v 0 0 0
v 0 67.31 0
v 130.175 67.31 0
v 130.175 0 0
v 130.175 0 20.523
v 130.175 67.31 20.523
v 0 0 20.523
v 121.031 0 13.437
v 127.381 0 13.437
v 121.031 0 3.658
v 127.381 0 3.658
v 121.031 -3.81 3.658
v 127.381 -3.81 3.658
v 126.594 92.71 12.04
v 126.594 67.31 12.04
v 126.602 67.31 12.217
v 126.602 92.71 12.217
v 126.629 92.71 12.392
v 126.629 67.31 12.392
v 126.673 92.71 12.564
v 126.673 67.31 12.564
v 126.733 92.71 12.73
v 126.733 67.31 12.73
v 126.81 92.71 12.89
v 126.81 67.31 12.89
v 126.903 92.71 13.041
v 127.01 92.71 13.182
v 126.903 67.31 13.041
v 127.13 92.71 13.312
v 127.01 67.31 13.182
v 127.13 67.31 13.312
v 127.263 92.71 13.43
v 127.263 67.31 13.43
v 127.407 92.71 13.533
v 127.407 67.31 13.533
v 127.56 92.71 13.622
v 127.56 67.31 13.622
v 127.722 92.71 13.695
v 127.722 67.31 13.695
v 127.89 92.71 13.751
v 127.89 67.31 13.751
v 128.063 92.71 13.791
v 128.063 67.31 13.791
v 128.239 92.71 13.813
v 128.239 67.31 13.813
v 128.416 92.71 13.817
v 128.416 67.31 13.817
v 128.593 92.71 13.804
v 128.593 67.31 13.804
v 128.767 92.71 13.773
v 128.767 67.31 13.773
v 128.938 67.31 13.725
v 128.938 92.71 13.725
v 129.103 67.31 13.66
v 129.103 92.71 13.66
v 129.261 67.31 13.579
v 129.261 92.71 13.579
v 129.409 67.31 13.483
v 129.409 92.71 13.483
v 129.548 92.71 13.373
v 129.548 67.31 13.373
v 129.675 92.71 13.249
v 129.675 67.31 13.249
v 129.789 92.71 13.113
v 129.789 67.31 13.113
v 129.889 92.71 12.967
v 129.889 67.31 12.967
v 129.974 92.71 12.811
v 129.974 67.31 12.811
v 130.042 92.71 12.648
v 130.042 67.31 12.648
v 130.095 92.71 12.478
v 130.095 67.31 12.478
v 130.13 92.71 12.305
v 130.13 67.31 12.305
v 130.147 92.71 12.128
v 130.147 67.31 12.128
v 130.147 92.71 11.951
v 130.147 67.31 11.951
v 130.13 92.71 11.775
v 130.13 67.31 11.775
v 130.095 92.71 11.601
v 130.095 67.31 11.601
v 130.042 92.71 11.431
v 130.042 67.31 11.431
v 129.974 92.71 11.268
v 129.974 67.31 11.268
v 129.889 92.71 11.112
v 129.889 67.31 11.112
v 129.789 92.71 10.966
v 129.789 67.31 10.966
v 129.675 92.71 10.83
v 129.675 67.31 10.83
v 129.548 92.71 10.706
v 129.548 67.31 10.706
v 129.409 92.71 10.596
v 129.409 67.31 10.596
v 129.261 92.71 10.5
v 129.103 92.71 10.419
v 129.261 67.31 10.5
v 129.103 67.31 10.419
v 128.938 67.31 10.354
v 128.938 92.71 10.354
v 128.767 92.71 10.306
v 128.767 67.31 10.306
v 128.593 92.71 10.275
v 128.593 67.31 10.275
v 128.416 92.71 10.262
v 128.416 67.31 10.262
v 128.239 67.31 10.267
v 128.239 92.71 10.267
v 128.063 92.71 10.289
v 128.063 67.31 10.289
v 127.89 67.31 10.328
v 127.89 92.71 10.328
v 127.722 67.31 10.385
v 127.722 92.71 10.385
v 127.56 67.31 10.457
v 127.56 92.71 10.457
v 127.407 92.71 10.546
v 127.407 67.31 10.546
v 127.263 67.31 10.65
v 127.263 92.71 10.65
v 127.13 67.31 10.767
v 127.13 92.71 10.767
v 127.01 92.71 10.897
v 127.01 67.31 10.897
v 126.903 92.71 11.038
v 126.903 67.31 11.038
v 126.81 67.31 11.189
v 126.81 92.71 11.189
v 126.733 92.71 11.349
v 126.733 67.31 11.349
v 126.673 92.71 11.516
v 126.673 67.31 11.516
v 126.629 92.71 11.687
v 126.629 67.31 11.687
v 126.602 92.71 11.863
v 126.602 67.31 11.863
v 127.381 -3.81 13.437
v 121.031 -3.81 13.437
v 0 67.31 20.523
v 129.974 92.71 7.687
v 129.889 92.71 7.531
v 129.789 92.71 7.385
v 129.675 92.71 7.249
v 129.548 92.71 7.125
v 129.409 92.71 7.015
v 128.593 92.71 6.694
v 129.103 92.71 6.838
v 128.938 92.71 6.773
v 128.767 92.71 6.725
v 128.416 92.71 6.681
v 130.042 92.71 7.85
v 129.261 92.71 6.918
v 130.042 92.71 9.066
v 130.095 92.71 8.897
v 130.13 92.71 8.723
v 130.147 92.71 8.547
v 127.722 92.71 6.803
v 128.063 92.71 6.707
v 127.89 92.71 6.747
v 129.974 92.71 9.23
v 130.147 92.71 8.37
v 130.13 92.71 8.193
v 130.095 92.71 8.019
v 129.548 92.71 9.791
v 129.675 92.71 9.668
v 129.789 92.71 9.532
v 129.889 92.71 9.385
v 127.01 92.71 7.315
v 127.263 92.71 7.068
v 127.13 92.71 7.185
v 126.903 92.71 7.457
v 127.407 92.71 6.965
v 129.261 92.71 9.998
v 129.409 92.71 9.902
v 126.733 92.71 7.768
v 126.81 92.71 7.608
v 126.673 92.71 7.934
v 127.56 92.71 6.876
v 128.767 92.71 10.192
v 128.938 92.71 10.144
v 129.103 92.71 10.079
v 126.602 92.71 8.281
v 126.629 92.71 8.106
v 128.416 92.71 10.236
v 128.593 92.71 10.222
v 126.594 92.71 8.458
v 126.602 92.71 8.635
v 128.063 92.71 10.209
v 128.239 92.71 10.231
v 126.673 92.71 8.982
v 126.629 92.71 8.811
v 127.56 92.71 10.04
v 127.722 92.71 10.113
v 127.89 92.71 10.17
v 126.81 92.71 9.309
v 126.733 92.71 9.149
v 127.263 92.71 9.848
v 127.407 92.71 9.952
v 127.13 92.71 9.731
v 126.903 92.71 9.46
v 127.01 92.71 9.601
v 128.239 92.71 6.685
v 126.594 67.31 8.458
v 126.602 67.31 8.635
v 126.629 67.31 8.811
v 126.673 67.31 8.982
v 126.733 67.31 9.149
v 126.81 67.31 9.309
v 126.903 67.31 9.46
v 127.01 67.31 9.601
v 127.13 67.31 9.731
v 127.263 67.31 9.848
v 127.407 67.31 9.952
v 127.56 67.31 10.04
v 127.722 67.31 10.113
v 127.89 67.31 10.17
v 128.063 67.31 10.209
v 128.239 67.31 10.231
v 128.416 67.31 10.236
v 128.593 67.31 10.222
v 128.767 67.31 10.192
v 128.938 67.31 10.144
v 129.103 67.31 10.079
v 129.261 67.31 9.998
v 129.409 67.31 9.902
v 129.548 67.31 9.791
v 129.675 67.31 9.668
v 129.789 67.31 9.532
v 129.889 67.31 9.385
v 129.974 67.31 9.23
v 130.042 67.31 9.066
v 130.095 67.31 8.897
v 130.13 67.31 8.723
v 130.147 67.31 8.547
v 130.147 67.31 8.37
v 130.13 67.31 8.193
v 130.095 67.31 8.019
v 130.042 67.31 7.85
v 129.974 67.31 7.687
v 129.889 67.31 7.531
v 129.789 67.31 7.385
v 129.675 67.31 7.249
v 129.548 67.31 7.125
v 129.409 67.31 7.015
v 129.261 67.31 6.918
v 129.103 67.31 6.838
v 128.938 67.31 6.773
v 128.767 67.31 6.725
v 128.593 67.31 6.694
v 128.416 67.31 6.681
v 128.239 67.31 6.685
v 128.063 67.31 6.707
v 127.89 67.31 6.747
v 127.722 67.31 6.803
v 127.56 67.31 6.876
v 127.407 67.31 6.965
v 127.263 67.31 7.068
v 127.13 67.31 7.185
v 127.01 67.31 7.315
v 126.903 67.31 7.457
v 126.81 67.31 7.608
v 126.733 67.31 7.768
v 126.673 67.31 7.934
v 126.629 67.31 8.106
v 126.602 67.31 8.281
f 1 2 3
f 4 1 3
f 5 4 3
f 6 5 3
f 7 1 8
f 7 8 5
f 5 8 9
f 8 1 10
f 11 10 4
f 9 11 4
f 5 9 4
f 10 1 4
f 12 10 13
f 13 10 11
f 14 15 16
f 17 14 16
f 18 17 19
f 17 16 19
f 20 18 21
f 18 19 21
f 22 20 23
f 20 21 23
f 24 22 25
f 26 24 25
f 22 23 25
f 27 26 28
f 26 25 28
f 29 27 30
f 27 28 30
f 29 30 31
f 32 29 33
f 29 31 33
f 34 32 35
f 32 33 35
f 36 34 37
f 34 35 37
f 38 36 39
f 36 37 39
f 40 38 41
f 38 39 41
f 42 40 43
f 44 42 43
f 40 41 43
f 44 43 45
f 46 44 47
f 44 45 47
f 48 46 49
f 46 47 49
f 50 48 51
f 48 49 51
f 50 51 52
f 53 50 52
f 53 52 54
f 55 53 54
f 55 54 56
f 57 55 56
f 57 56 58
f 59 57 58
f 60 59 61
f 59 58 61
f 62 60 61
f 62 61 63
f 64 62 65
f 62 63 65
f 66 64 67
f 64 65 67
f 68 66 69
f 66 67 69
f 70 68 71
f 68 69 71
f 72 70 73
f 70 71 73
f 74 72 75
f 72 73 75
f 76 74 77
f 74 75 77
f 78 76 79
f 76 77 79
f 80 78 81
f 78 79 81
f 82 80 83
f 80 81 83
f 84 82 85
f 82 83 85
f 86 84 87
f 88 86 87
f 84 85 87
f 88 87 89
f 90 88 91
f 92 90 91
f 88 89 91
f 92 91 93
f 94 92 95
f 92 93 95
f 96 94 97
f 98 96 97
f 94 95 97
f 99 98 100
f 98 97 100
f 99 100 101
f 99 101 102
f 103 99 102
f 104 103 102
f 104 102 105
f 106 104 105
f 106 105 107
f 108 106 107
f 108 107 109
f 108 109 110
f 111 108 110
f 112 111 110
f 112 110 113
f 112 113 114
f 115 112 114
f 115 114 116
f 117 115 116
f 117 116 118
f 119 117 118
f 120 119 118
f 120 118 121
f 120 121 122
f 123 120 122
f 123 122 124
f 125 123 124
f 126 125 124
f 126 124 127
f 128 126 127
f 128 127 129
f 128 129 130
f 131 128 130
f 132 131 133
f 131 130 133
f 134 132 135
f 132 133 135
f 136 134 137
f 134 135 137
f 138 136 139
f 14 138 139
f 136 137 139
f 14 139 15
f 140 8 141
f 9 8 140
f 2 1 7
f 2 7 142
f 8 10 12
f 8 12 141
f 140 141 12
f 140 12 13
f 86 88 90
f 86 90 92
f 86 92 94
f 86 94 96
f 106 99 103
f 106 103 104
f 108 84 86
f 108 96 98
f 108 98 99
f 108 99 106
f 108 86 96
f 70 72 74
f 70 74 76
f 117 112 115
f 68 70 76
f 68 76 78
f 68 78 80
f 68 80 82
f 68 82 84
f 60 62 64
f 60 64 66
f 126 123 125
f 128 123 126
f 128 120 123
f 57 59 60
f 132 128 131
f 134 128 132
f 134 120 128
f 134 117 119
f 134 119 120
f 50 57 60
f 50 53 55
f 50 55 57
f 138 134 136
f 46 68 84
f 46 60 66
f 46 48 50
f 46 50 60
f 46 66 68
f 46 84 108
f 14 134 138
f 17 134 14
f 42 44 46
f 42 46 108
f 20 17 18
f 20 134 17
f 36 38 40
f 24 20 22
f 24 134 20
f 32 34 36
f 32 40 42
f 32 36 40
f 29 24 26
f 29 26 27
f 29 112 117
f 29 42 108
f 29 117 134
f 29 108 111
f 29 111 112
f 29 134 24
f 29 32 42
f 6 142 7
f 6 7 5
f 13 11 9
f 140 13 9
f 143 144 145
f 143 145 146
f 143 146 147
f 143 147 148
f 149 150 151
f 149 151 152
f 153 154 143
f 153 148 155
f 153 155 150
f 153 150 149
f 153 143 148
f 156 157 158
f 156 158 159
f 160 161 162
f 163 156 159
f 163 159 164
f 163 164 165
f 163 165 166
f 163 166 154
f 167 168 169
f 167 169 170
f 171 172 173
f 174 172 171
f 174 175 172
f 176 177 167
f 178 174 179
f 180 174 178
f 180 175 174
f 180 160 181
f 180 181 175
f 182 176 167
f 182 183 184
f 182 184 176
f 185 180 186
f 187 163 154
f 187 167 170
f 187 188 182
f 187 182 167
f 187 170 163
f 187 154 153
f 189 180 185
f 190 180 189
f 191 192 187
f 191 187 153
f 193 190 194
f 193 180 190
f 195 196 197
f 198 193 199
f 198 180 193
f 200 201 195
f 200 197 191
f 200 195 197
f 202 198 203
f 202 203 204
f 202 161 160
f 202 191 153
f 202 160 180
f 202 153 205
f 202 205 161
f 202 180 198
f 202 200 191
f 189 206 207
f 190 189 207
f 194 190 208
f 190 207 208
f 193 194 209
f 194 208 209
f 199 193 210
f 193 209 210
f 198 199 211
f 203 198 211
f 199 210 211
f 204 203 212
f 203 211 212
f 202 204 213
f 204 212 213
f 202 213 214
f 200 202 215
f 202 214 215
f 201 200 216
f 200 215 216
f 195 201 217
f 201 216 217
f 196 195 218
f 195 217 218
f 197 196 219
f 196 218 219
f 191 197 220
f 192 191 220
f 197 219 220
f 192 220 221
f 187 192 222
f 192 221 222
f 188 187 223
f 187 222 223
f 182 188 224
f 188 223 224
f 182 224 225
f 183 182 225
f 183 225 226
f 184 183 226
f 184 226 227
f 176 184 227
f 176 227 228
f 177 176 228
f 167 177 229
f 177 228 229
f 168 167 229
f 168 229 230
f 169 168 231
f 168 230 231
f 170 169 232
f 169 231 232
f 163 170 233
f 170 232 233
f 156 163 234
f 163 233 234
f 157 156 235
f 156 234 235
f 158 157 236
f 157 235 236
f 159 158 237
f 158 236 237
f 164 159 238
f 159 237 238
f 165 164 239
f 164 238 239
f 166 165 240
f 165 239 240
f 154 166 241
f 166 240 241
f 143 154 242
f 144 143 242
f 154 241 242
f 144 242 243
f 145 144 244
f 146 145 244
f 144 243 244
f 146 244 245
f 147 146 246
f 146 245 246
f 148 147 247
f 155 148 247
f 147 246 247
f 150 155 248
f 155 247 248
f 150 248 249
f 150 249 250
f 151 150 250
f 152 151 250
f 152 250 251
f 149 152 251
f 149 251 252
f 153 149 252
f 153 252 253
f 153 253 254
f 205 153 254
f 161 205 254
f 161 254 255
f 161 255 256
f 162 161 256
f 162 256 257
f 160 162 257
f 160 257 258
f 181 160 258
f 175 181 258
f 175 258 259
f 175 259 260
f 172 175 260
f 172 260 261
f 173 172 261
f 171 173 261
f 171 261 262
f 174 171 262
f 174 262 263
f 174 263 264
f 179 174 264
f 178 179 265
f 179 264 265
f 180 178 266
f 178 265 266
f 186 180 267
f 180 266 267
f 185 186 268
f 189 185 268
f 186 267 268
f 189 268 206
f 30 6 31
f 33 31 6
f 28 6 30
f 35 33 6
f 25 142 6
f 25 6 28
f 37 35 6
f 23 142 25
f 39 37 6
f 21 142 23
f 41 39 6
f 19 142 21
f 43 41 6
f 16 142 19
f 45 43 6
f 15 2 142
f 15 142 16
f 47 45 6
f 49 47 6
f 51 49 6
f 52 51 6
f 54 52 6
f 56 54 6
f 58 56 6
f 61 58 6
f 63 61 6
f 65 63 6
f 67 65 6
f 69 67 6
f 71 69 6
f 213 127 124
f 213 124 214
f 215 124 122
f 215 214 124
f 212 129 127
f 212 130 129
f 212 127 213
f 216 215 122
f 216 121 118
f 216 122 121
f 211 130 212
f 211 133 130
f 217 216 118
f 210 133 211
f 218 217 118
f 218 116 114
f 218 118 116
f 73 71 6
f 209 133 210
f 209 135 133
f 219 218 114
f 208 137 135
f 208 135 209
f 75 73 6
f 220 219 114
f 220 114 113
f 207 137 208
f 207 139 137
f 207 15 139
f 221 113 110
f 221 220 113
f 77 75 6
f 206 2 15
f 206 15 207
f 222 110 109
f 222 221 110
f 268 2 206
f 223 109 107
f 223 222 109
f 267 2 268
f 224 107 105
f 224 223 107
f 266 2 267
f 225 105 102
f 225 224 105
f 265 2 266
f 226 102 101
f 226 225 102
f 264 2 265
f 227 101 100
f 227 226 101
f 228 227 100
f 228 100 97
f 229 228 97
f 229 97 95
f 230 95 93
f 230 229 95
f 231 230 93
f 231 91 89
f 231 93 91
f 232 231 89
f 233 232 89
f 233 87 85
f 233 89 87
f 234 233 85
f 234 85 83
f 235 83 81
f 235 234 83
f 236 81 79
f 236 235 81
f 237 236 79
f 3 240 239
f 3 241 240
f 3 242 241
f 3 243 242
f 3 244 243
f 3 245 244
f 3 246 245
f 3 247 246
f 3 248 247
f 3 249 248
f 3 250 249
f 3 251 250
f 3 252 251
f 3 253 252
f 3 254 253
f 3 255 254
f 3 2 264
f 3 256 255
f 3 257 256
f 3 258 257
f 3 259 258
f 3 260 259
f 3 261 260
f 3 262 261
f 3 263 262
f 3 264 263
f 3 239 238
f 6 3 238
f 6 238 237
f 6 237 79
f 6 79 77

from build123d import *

# Parameters (mm, degrees)
F0_W     = 130.175
F0_H     = 67.31
F1_DEPTH = 20.5232
F2_W     = 6.35
F2_H     = 9.779
F3_DEPTH = 3.81
F4_R     = 1.778
F5_DEPTH = 25.4


with BuildPart() as f1:
    # F0 (on Top) → F1 (new body)
    with BuildSketch(Plane.XY):
        with Locations((65.0875, 33.655)):
            Rectangle(F0_W, F0_H)
    extrude(amount=F1_DEPTH)

    # F2 (on face) → F3 (join)
    with BuildSketch(Plane.XZ):
        with Locations((124.206, 8.5471)):
            Rectangle(F2_W, F2_H)
    extrude(amount=F3_DEPTH)

    # F4 (on face) → F5 (join)
    with BuildSketch(Plane(origin=(0, 67.31, 0), x_dir=(-1, 0, 0), z_dir=(0, 1, 0))):
        with Locations((-128.3716, 8.4582)):
            Circle(F4_R)
        with Locations((-128.3716, 12.0396)):
            Circle(F4_R)
    extrude(amount=F5_DEPTH)


solid = f1.part
